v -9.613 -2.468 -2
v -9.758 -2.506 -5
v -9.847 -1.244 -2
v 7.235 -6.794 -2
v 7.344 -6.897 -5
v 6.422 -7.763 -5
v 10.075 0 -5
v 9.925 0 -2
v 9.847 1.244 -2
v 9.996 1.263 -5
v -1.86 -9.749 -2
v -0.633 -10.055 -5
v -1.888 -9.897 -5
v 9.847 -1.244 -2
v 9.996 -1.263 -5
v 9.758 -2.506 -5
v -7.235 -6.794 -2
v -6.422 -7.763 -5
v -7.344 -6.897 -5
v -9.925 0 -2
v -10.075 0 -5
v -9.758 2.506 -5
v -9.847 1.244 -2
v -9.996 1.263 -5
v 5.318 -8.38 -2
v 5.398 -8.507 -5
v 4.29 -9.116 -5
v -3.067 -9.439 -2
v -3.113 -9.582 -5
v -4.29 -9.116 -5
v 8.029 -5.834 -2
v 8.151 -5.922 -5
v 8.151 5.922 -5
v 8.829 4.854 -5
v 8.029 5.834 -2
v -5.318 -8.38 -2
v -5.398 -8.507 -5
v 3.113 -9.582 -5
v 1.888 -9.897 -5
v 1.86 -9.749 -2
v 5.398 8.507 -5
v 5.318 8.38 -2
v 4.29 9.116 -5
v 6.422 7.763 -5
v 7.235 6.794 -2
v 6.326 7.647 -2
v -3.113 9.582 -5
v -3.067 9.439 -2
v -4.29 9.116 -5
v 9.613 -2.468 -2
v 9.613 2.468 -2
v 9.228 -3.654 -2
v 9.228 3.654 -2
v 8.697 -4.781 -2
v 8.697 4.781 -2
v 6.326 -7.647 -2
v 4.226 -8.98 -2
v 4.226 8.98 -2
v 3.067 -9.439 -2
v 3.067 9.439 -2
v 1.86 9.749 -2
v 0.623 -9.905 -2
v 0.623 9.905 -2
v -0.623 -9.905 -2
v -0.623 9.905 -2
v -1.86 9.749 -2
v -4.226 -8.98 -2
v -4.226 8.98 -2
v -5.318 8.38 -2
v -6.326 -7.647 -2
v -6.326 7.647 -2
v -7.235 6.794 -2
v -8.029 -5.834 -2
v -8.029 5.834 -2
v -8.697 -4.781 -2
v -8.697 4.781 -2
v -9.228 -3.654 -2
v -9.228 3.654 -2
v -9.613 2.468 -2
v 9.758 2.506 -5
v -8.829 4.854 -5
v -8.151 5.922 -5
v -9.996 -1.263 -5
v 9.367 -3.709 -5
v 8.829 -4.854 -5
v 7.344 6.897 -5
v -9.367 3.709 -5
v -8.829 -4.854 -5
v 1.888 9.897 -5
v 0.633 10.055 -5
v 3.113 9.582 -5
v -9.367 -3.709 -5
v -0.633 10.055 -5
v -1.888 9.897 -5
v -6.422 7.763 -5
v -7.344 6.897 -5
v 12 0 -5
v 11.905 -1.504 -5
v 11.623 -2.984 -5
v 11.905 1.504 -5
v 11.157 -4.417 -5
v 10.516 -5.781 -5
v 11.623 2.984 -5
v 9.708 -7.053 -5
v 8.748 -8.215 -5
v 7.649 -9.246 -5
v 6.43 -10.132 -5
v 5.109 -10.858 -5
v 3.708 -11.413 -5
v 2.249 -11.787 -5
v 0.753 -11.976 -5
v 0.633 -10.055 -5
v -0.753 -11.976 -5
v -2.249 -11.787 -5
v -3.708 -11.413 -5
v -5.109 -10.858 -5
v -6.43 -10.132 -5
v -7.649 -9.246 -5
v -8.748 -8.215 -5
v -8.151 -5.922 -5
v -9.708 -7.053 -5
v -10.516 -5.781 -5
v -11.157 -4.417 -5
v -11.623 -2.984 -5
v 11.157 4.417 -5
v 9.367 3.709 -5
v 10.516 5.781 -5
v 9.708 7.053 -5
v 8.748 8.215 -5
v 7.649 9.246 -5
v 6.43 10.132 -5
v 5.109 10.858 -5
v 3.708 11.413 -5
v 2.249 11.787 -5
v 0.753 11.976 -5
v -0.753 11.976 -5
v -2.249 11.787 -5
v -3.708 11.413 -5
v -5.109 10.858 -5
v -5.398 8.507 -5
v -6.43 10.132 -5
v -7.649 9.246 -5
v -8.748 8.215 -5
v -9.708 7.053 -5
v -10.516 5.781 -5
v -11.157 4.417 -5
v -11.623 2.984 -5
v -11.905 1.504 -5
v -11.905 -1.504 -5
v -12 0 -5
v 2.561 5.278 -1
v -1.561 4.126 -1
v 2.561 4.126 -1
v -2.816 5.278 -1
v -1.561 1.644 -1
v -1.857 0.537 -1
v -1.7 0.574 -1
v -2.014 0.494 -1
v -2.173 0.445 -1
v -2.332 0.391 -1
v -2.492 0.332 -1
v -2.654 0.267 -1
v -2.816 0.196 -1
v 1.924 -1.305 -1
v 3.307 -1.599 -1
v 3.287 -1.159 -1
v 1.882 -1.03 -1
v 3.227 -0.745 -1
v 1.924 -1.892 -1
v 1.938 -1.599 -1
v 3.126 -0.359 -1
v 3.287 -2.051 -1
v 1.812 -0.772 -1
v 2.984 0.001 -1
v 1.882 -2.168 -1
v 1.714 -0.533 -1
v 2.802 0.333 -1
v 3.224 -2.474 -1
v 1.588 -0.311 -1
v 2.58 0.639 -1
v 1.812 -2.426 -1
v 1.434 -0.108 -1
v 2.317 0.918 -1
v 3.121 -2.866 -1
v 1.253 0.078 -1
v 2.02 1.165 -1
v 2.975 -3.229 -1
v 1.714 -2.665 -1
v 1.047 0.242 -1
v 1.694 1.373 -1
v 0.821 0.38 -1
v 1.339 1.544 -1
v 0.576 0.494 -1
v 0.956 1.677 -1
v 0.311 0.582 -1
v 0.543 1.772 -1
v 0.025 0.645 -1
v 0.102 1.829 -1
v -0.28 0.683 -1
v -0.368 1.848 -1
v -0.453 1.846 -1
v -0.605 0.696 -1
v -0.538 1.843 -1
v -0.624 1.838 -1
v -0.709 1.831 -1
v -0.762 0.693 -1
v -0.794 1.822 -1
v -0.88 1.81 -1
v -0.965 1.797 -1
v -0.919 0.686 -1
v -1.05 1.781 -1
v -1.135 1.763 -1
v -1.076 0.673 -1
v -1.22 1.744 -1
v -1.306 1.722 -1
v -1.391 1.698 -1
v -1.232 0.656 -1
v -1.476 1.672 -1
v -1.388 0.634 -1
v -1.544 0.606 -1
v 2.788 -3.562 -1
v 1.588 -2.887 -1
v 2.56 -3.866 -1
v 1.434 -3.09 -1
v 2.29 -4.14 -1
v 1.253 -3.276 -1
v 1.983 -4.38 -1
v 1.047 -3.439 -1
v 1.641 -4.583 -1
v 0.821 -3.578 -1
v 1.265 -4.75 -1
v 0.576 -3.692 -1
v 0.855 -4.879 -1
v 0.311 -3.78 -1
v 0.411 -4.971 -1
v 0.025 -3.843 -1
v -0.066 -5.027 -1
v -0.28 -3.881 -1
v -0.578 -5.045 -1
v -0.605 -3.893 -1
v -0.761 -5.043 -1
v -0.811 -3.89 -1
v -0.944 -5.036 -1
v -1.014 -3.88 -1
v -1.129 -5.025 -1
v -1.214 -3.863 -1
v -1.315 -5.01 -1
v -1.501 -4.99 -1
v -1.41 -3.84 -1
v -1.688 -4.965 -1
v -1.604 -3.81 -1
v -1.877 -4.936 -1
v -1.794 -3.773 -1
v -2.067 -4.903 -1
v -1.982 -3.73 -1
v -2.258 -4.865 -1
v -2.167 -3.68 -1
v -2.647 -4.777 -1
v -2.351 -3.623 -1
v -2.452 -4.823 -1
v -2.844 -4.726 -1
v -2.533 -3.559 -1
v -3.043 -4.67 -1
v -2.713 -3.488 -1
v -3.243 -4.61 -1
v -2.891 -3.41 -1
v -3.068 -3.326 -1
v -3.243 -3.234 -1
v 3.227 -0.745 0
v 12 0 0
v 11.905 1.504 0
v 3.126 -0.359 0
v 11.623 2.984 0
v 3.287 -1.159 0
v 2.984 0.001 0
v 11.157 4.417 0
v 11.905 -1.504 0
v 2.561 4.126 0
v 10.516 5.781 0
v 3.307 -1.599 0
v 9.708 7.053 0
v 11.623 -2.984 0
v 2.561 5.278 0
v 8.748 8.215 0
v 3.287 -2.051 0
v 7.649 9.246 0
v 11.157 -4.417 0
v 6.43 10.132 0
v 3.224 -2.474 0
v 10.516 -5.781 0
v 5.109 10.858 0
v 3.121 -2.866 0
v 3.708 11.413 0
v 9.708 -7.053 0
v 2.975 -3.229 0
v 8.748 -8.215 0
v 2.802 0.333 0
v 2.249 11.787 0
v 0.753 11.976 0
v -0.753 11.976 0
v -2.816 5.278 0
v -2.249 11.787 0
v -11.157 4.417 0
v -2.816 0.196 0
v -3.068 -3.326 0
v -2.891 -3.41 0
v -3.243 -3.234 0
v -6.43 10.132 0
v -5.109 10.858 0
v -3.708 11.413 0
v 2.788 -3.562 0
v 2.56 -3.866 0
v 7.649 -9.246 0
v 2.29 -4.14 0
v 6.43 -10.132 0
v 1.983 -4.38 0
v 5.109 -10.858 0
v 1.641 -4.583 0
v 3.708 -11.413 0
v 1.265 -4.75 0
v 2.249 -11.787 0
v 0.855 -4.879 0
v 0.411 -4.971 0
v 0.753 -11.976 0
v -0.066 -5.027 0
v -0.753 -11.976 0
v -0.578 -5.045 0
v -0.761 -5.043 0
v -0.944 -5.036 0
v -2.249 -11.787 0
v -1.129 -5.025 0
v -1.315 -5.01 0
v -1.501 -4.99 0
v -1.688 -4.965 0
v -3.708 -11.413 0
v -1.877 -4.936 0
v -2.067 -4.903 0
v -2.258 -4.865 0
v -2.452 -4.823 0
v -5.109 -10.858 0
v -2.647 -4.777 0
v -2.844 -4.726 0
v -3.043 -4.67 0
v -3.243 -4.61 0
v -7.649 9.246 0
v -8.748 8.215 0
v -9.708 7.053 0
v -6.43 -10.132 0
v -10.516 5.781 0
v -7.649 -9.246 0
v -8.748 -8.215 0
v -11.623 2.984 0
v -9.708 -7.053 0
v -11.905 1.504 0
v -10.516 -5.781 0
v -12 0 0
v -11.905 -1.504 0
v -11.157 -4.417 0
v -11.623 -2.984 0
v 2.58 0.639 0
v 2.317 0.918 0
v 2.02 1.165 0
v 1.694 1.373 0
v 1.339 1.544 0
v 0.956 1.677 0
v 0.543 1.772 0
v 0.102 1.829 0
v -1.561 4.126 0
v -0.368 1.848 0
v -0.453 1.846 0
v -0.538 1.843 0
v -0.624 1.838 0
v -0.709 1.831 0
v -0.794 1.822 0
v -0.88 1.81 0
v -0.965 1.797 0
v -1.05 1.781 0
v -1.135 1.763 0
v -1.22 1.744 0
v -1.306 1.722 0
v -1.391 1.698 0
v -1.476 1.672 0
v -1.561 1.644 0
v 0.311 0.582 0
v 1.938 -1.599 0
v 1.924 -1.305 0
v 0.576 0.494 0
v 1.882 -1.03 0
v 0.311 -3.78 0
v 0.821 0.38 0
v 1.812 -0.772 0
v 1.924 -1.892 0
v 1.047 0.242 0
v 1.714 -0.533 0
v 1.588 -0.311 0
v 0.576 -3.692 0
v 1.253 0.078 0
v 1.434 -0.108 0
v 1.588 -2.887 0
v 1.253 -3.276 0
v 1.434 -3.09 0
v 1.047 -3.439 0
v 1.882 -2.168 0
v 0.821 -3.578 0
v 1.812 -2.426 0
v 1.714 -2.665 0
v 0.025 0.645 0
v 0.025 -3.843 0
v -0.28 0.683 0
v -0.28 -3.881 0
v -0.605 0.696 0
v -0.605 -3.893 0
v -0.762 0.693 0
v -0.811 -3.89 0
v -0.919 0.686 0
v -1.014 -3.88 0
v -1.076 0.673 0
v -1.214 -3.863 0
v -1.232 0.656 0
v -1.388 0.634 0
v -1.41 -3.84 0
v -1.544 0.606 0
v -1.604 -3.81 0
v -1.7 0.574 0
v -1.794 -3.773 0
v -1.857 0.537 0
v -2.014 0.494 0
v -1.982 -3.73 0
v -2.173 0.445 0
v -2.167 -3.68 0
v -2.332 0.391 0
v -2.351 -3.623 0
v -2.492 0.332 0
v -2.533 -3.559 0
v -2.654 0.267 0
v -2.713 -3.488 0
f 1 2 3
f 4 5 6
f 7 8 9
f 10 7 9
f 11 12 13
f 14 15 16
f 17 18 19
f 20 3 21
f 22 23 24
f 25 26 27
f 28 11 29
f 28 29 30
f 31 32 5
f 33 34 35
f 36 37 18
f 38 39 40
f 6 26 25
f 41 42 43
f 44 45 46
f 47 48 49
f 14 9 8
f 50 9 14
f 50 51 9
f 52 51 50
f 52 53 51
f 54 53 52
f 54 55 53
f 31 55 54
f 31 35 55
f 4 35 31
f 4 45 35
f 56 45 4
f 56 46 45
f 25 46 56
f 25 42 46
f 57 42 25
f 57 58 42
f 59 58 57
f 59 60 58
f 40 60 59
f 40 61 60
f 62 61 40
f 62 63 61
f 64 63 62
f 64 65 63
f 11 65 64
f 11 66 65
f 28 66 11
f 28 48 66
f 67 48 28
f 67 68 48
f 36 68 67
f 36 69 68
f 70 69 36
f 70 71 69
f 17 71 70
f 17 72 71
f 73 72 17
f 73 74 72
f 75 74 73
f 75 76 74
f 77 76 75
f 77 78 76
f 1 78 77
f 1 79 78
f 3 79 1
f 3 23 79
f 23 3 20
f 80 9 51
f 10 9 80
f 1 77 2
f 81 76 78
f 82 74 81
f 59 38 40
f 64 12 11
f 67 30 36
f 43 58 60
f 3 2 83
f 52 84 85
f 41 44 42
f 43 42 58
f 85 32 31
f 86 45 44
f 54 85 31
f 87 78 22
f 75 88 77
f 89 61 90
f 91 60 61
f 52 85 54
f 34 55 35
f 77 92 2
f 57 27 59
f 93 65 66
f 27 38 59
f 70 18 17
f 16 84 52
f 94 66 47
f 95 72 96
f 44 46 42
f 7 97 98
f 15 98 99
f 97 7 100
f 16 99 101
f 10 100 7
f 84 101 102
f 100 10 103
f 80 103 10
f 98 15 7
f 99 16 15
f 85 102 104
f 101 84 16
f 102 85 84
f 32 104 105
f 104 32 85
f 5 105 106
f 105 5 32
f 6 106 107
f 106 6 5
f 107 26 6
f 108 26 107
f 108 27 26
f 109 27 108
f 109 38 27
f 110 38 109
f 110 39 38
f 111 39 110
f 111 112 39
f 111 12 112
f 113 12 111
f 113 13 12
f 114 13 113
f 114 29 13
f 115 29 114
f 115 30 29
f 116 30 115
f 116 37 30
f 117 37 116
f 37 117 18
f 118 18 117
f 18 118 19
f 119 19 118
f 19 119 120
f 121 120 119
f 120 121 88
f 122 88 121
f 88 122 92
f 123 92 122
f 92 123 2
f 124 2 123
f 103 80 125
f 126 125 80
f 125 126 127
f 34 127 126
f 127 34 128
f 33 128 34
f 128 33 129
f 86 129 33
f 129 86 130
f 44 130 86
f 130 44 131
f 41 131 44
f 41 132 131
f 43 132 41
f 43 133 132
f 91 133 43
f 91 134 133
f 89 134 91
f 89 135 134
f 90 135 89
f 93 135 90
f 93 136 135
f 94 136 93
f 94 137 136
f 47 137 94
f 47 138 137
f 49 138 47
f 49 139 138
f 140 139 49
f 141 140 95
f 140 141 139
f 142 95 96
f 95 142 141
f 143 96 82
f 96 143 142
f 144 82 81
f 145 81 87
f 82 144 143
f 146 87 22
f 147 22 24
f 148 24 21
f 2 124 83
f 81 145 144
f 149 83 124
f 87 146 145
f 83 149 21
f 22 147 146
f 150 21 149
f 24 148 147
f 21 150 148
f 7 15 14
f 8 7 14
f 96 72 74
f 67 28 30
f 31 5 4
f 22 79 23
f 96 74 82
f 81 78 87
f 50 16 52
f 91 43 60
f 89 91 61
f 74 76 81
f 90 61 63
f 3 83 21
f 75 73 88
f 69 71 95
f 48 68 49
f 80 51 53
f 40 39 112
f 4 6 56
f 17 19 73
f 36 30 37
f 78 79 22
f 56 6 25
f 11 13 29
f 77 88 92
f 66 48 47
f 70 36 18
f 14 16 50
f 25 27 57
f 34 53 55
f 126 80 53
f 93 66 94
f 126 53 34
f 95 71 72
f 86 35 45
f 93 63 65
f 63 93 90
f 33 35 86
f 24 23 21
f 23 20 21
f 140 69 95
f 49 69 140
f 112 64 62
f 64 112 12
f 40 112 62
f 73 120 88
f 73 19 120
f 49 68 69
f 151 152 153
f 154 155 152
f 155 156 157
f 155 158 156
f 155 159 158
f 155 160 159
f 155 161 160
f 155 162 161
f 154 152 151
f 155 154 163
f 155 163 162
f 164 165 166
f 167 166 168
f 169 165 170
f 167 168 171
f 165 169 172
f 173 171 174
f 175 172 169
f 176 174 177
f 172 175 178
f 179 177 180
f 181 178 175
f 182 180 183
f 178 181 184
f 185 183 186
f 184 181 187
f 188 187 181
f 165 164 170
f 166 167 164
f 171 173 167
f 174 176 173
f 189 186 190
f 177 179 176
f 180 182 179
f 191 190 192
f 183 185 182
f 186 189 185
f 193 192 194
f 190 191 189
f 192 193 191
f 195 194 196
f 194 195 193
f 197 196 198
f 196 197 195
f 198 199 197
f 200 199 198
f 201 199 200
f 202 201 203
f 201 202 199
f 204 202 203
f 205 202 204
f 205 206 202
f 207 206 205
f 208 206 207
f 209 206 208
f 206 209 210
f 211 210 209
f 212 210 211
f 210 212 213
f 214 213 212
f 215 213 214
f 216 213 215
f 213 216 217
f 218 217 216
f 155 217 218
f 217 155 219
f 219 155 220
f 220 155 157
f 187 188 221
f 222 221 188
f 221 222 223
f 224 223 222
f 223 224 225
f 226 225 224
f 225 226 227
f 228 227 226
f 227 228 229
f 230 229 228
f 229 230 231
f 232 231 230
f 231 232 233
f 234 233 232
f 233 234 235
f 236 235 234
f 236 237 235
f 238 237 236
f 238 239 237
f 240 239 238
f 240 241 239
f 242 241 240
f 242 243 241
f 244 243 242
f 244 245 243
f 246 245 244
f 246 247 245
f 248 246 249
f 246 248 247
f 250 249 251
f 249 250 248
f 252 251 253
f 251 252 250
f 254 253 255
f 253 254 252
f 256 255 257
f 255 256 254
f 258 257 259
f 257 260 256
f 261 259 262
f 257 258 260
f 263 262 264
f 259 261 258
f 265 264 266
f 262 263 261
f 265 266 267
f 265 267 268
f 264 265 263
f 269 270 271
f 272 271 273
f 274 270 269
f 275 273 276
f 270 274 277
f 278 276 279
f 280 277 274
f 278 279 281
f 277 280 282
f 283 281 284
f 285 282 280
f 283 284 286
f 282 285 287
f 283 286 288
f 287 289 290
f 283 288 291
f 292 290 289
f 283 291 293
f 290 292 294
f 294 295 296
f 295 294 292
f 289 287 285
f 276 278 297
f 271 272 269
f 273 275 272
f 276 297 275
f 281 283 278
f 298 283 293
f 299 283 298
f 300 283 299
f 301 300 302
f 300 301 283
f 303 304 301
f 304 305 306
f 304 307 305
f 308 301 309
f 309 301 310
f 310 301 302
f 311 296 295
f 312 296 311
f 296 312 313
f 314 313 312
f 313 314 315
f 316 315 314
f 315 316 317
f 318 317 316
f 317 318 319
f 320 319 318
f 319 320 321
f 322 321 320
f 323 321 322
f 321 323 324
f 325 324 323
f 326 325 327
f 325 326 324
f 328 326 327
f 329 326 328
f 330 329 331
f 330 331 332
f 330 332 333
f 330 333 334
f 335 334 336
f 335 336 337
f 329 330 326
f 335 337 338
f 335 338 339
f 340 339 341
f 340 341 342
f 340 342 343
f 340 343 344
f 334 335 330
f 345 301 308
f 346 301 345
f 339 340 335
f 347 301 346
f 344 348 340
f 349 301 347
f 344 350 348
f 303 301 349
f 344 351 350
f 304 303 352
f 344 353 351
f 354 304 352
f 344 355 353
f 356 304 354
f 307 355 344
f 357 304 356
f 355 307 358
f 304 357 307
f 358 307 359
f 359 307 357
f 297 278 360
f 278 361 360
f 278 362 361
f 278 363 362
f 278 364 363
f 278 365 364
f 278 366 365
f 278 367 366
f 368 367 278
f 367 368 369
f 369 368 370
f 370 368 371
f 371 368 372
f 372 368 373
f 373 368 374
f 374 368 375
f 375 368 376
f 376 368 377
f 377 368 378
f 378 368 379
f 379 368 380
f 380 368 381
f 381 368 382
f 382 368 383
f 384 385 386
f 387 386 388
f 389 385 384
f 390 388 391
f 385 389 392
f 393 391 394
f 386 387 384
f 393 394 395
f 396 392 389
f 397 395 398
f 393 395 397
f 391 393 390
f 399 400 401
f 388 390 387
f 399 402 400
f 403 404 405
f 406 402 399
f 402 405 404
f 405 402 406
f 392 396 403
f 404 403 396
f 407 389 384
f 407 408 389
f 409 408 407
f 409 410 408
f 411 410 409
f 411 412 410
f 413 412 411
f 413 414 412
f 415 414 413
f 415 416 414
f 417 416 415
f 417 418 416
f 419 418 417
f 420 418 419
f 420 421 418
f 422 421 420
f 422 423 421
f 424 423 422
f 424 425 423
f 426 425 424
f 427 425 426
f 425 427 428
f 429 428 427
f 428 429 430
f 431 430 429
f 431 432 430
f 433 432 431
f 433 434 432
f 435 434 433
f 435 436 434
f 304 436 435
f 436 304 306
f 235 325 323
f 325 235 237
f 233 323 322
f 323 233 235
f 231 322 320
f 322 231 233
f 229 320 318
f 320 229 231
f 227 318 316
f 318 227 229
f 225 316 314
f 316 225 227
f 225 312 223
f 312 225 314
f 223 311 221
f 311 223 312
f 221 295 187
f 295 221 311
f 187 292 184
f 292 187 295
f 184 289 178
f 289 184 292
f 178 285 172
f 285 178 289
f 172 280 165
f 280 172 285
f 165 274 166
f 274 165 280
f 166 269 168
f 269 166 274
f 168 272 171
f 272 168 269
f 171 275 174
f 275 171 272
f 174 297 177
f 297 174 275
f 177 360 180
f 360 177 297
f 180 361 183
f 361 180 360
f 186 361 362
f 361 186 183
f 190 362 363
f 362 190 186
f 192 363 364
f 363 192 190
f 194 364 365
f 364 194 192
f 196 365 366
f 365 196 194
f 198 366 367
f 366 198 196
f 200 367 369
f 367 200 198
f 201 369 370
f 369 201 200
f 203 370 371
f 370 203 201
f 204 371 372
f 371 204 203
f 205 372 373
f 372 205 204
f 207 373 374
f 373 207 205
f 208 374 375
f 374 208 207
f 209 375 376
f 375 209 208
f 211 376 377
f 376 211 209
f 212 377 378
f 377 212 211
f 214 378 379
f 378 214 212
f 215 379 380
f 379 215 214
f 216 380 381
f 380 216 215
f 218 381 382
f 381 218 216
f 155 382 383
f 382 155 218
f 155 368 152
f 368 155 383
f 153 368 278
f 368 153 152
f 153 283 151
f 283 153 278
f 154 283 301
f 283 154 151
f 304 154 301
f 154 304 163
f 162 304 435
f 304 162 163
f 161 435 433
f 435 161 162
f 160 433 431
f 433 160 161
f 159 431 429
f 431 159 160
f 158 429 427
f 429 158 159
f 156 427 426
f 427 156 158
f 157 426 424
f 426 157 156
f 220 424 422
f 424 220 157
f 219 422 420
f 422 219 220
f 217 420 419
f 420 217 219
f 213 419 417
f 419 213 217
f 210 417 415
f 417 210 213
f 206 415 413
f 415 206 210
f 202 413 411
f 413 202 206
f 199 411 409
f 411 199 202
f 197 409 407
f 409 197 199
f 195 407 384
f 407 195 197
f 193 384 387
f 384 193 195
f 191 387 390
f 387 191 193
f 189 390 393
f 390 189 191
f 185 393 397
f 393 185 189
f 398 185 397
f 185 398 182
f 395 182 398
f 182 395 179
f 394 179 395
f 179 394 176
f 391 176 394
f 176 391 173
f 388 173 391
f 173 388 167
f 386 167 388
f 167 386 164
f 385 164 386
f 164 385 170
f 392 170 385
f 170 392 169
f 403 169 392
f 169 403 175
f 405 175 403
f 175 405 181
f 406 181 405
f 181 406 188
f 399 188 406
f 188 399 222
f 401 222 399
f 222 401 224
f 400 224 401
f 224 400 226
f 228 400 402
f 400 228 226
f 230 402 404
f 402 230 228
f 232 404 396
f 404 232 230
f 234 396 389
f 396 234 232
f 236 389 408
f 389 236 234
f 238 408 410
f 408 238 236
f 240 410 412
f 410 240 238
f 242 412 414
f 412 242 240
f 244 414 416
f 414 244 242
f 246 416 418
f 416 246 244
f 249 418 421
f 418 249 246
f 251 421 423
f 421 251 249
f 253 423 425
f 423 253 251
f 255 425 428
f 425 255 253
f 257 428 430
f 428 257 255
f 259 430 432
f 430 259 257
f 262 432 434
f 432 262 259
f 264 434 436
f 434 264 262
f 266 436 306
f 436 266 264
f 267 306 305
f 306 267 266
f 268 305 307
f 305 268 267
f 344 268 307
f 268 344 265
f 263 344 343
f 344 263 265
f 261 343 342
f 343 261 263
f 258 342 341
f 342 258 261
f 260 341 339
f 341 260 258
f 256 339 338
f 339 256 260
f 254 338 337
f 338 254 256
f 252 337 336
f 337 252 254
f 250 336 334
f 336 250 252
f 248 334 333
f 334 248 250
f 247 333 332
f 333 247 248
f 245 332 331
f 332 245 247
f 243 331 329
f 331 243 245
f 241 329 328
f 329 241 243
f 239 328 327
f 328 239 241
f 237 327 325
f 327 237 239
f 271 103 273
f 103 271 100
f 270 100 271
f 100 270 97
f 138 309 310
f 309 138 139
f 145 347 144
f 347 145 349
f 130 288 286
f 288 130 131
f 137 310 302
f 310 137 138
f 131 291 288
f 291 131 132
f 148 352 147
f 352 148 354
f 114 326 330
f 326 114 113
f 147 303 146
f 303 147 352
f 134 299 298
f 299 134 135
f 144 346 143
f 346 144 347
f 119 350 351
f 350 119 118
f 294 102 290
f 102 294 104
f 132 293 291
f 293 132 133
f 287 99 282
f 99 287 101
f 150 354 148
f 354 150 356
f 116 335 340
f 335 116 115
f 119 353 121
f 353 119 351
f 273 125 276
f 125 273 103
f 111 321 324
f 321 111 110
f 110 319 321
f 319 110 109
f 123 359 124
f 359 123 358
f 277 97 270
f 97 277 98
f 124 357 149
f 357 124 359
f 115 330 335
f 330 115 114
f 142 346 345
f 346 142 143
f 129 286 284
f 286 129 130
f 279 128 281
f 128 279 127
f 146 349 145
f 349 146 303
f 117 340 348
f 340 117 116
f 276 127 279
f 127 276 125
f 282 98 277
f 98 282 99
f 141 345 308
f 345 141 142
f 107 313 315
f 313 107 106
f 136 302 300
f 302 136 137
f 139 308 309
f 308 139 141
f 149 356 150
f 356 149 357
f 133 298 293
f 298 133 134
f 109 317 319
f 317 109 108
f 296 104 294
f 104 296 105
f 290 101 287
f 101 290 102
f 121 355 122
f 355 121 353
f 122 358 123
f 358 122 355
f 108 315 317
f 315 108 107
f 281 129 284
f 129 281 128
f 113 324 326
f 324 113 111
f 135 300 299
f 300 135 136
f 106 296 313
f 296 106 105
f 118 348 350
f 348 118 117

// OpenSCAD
$fn = 50;

difference() {
	union() {
		translate(v = [0, 0, -5.0]) {
			cylinder(h = 5, r = 12.0);
		}
	}
	union() {
		#translate(v = [0, 0, -5.0]) {
			cylinder(h = 3, r1 = 10.075, r2 = 9.925);
		}
		translate(v = [0, 0, -1]) {
			linear_extrude(height = 1) {
				text(font = "Impact", halign = "center", size = 10, text = "5", valign = "center");
			}
		}
	}
}
